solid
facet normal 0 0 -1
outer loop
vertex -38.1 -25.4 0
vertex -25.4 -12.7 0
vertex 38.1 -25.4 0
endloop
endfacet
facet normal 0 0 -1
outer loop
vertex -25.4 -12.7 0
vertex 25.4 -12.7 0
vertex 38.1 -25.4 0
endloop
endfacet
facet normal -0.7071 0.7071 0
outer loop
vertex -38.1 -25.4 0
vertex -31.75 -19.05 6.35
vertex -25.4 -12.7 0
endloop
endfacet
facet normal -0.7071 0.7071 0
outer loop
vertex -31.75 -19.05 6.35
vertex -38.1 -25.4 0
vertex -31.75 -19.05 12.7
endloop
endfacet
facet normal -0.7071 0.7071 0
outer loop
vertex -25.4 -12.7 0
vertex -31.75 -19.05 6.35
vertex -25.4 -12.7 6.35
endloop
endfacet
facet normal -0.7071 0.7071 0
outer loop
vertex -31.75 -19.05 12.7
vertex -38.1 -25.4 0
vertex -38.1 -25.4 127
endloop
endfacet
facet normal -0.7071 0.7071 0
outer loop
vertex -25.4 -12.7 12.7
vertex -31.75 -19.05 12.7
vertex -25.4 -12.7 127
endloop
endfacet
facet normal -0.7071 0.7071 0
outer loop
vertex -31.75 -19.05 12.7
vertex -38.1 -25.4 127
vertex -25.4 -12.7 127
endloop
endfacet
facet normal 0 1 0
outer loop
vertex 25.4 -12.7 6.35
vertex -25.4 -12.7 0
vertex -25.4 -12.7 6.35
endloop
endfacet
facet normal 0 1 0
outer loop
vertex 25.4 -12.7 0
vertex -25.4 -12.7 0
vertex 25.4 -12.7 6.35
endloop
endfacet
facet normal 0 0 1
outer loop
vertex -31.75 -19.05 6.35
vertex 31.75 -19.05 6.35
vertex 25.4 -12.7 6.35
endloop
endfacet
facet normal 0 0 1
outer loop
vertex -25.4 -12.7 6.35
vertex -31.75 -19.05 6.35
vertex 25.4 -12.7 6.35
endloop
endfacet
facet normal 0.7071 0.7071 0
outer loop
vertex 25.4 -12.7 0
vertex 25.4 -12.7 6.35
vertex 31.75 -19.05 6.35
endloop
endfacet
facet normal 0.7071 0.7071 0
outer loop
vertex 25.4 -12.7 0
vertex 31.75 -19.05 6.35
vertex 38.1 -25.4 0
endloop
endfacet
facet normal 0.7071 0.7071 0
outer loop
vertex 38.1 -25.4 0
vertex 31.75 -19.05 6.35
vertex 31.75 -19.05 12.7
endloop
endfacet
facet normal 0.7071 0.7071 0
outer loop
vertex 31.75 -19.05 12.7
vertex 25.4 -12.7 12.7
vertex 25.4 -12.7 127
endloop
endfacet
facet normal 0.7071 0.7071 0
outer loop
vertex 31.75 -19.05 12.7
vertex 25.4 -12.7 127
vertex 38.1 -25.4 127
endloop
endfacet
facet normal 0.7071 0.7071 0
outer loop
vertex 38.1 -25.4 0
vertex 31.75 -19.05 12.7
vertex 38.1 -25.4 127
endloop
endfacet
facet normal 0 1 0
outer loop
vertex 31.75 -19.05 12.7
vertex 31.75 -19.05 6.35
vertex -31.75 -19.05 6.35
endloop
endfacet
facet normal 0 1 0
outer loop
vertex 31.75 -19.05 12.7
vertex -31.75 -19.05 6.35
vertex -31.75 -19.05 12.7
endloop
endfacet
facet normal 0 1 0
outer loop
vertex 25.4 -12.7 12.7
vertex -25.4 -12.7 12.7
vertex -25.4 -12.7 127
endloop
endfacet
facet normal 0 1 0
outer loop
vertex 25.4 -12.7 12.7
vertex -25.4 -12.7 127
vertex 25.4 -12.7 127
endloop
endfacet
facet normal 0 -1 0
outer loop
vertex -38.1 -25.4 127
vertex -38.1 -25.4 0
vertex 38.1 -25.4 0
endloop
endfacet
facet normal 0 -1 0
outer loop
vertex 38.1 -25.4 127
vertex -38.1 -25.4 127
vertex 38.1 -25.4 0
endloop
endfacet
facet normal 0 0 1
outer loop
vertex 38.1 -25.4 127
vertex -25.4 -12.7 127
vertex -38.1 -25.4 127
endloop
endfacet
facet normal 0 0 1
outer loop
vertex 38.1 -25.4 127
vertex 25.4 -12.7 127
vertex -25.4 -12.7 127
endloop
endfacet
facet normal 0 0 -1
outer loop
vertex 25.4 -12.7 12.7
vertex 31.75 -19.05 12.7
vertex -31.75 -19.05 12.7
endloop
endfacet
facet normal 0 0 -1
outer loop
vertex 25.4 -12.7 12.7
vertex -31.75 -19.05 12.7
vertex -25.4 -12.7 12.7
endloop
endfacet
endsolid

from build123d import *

# Parameters (mm, degrees)
F0_W     = 76.2
F0_H     = 12.7
F1_DEPTH = 127
F2_W     = 6.35
F2_H     = 6.35
F3_DEPTH = 76.2
F5_DEPTH = 127.001


with BuildPart() as f1:
    # F0 (on Top) → F1 (new body)
    with BuildSketch(Plane.XY):
        with Locations((0, -19.05)):
            Rectangle(F0_W, F0_H)
    extrude(amount=F1_DEPTH)

    # F2 (on face) → F3 (cut, through all)
    with BuildSketch(Plane.YZ.offset(38.1)):
        with Locations((-15.875, 9.525)):
            Rectangle(F2_W, F2_H)
    extrude(amount=-F3_DEPTH, mode=Mode.SUBTRACT)

    # F4 (on face) → F5 (cut, through all)
    with BuildSketch(Plane.XY.offset(127)):
        Polygon((-38.1, -12.7), (-38.1, -25.4), (-25.4, -12.7), align=None)
        Polygon((25.4, -12.7), (38.1, -25.4), (38.1, -12.7), align=None)
    extrude(amount=-F5_DEPTH, mode=Mode.SUBTRACT)


solid = f1.part
